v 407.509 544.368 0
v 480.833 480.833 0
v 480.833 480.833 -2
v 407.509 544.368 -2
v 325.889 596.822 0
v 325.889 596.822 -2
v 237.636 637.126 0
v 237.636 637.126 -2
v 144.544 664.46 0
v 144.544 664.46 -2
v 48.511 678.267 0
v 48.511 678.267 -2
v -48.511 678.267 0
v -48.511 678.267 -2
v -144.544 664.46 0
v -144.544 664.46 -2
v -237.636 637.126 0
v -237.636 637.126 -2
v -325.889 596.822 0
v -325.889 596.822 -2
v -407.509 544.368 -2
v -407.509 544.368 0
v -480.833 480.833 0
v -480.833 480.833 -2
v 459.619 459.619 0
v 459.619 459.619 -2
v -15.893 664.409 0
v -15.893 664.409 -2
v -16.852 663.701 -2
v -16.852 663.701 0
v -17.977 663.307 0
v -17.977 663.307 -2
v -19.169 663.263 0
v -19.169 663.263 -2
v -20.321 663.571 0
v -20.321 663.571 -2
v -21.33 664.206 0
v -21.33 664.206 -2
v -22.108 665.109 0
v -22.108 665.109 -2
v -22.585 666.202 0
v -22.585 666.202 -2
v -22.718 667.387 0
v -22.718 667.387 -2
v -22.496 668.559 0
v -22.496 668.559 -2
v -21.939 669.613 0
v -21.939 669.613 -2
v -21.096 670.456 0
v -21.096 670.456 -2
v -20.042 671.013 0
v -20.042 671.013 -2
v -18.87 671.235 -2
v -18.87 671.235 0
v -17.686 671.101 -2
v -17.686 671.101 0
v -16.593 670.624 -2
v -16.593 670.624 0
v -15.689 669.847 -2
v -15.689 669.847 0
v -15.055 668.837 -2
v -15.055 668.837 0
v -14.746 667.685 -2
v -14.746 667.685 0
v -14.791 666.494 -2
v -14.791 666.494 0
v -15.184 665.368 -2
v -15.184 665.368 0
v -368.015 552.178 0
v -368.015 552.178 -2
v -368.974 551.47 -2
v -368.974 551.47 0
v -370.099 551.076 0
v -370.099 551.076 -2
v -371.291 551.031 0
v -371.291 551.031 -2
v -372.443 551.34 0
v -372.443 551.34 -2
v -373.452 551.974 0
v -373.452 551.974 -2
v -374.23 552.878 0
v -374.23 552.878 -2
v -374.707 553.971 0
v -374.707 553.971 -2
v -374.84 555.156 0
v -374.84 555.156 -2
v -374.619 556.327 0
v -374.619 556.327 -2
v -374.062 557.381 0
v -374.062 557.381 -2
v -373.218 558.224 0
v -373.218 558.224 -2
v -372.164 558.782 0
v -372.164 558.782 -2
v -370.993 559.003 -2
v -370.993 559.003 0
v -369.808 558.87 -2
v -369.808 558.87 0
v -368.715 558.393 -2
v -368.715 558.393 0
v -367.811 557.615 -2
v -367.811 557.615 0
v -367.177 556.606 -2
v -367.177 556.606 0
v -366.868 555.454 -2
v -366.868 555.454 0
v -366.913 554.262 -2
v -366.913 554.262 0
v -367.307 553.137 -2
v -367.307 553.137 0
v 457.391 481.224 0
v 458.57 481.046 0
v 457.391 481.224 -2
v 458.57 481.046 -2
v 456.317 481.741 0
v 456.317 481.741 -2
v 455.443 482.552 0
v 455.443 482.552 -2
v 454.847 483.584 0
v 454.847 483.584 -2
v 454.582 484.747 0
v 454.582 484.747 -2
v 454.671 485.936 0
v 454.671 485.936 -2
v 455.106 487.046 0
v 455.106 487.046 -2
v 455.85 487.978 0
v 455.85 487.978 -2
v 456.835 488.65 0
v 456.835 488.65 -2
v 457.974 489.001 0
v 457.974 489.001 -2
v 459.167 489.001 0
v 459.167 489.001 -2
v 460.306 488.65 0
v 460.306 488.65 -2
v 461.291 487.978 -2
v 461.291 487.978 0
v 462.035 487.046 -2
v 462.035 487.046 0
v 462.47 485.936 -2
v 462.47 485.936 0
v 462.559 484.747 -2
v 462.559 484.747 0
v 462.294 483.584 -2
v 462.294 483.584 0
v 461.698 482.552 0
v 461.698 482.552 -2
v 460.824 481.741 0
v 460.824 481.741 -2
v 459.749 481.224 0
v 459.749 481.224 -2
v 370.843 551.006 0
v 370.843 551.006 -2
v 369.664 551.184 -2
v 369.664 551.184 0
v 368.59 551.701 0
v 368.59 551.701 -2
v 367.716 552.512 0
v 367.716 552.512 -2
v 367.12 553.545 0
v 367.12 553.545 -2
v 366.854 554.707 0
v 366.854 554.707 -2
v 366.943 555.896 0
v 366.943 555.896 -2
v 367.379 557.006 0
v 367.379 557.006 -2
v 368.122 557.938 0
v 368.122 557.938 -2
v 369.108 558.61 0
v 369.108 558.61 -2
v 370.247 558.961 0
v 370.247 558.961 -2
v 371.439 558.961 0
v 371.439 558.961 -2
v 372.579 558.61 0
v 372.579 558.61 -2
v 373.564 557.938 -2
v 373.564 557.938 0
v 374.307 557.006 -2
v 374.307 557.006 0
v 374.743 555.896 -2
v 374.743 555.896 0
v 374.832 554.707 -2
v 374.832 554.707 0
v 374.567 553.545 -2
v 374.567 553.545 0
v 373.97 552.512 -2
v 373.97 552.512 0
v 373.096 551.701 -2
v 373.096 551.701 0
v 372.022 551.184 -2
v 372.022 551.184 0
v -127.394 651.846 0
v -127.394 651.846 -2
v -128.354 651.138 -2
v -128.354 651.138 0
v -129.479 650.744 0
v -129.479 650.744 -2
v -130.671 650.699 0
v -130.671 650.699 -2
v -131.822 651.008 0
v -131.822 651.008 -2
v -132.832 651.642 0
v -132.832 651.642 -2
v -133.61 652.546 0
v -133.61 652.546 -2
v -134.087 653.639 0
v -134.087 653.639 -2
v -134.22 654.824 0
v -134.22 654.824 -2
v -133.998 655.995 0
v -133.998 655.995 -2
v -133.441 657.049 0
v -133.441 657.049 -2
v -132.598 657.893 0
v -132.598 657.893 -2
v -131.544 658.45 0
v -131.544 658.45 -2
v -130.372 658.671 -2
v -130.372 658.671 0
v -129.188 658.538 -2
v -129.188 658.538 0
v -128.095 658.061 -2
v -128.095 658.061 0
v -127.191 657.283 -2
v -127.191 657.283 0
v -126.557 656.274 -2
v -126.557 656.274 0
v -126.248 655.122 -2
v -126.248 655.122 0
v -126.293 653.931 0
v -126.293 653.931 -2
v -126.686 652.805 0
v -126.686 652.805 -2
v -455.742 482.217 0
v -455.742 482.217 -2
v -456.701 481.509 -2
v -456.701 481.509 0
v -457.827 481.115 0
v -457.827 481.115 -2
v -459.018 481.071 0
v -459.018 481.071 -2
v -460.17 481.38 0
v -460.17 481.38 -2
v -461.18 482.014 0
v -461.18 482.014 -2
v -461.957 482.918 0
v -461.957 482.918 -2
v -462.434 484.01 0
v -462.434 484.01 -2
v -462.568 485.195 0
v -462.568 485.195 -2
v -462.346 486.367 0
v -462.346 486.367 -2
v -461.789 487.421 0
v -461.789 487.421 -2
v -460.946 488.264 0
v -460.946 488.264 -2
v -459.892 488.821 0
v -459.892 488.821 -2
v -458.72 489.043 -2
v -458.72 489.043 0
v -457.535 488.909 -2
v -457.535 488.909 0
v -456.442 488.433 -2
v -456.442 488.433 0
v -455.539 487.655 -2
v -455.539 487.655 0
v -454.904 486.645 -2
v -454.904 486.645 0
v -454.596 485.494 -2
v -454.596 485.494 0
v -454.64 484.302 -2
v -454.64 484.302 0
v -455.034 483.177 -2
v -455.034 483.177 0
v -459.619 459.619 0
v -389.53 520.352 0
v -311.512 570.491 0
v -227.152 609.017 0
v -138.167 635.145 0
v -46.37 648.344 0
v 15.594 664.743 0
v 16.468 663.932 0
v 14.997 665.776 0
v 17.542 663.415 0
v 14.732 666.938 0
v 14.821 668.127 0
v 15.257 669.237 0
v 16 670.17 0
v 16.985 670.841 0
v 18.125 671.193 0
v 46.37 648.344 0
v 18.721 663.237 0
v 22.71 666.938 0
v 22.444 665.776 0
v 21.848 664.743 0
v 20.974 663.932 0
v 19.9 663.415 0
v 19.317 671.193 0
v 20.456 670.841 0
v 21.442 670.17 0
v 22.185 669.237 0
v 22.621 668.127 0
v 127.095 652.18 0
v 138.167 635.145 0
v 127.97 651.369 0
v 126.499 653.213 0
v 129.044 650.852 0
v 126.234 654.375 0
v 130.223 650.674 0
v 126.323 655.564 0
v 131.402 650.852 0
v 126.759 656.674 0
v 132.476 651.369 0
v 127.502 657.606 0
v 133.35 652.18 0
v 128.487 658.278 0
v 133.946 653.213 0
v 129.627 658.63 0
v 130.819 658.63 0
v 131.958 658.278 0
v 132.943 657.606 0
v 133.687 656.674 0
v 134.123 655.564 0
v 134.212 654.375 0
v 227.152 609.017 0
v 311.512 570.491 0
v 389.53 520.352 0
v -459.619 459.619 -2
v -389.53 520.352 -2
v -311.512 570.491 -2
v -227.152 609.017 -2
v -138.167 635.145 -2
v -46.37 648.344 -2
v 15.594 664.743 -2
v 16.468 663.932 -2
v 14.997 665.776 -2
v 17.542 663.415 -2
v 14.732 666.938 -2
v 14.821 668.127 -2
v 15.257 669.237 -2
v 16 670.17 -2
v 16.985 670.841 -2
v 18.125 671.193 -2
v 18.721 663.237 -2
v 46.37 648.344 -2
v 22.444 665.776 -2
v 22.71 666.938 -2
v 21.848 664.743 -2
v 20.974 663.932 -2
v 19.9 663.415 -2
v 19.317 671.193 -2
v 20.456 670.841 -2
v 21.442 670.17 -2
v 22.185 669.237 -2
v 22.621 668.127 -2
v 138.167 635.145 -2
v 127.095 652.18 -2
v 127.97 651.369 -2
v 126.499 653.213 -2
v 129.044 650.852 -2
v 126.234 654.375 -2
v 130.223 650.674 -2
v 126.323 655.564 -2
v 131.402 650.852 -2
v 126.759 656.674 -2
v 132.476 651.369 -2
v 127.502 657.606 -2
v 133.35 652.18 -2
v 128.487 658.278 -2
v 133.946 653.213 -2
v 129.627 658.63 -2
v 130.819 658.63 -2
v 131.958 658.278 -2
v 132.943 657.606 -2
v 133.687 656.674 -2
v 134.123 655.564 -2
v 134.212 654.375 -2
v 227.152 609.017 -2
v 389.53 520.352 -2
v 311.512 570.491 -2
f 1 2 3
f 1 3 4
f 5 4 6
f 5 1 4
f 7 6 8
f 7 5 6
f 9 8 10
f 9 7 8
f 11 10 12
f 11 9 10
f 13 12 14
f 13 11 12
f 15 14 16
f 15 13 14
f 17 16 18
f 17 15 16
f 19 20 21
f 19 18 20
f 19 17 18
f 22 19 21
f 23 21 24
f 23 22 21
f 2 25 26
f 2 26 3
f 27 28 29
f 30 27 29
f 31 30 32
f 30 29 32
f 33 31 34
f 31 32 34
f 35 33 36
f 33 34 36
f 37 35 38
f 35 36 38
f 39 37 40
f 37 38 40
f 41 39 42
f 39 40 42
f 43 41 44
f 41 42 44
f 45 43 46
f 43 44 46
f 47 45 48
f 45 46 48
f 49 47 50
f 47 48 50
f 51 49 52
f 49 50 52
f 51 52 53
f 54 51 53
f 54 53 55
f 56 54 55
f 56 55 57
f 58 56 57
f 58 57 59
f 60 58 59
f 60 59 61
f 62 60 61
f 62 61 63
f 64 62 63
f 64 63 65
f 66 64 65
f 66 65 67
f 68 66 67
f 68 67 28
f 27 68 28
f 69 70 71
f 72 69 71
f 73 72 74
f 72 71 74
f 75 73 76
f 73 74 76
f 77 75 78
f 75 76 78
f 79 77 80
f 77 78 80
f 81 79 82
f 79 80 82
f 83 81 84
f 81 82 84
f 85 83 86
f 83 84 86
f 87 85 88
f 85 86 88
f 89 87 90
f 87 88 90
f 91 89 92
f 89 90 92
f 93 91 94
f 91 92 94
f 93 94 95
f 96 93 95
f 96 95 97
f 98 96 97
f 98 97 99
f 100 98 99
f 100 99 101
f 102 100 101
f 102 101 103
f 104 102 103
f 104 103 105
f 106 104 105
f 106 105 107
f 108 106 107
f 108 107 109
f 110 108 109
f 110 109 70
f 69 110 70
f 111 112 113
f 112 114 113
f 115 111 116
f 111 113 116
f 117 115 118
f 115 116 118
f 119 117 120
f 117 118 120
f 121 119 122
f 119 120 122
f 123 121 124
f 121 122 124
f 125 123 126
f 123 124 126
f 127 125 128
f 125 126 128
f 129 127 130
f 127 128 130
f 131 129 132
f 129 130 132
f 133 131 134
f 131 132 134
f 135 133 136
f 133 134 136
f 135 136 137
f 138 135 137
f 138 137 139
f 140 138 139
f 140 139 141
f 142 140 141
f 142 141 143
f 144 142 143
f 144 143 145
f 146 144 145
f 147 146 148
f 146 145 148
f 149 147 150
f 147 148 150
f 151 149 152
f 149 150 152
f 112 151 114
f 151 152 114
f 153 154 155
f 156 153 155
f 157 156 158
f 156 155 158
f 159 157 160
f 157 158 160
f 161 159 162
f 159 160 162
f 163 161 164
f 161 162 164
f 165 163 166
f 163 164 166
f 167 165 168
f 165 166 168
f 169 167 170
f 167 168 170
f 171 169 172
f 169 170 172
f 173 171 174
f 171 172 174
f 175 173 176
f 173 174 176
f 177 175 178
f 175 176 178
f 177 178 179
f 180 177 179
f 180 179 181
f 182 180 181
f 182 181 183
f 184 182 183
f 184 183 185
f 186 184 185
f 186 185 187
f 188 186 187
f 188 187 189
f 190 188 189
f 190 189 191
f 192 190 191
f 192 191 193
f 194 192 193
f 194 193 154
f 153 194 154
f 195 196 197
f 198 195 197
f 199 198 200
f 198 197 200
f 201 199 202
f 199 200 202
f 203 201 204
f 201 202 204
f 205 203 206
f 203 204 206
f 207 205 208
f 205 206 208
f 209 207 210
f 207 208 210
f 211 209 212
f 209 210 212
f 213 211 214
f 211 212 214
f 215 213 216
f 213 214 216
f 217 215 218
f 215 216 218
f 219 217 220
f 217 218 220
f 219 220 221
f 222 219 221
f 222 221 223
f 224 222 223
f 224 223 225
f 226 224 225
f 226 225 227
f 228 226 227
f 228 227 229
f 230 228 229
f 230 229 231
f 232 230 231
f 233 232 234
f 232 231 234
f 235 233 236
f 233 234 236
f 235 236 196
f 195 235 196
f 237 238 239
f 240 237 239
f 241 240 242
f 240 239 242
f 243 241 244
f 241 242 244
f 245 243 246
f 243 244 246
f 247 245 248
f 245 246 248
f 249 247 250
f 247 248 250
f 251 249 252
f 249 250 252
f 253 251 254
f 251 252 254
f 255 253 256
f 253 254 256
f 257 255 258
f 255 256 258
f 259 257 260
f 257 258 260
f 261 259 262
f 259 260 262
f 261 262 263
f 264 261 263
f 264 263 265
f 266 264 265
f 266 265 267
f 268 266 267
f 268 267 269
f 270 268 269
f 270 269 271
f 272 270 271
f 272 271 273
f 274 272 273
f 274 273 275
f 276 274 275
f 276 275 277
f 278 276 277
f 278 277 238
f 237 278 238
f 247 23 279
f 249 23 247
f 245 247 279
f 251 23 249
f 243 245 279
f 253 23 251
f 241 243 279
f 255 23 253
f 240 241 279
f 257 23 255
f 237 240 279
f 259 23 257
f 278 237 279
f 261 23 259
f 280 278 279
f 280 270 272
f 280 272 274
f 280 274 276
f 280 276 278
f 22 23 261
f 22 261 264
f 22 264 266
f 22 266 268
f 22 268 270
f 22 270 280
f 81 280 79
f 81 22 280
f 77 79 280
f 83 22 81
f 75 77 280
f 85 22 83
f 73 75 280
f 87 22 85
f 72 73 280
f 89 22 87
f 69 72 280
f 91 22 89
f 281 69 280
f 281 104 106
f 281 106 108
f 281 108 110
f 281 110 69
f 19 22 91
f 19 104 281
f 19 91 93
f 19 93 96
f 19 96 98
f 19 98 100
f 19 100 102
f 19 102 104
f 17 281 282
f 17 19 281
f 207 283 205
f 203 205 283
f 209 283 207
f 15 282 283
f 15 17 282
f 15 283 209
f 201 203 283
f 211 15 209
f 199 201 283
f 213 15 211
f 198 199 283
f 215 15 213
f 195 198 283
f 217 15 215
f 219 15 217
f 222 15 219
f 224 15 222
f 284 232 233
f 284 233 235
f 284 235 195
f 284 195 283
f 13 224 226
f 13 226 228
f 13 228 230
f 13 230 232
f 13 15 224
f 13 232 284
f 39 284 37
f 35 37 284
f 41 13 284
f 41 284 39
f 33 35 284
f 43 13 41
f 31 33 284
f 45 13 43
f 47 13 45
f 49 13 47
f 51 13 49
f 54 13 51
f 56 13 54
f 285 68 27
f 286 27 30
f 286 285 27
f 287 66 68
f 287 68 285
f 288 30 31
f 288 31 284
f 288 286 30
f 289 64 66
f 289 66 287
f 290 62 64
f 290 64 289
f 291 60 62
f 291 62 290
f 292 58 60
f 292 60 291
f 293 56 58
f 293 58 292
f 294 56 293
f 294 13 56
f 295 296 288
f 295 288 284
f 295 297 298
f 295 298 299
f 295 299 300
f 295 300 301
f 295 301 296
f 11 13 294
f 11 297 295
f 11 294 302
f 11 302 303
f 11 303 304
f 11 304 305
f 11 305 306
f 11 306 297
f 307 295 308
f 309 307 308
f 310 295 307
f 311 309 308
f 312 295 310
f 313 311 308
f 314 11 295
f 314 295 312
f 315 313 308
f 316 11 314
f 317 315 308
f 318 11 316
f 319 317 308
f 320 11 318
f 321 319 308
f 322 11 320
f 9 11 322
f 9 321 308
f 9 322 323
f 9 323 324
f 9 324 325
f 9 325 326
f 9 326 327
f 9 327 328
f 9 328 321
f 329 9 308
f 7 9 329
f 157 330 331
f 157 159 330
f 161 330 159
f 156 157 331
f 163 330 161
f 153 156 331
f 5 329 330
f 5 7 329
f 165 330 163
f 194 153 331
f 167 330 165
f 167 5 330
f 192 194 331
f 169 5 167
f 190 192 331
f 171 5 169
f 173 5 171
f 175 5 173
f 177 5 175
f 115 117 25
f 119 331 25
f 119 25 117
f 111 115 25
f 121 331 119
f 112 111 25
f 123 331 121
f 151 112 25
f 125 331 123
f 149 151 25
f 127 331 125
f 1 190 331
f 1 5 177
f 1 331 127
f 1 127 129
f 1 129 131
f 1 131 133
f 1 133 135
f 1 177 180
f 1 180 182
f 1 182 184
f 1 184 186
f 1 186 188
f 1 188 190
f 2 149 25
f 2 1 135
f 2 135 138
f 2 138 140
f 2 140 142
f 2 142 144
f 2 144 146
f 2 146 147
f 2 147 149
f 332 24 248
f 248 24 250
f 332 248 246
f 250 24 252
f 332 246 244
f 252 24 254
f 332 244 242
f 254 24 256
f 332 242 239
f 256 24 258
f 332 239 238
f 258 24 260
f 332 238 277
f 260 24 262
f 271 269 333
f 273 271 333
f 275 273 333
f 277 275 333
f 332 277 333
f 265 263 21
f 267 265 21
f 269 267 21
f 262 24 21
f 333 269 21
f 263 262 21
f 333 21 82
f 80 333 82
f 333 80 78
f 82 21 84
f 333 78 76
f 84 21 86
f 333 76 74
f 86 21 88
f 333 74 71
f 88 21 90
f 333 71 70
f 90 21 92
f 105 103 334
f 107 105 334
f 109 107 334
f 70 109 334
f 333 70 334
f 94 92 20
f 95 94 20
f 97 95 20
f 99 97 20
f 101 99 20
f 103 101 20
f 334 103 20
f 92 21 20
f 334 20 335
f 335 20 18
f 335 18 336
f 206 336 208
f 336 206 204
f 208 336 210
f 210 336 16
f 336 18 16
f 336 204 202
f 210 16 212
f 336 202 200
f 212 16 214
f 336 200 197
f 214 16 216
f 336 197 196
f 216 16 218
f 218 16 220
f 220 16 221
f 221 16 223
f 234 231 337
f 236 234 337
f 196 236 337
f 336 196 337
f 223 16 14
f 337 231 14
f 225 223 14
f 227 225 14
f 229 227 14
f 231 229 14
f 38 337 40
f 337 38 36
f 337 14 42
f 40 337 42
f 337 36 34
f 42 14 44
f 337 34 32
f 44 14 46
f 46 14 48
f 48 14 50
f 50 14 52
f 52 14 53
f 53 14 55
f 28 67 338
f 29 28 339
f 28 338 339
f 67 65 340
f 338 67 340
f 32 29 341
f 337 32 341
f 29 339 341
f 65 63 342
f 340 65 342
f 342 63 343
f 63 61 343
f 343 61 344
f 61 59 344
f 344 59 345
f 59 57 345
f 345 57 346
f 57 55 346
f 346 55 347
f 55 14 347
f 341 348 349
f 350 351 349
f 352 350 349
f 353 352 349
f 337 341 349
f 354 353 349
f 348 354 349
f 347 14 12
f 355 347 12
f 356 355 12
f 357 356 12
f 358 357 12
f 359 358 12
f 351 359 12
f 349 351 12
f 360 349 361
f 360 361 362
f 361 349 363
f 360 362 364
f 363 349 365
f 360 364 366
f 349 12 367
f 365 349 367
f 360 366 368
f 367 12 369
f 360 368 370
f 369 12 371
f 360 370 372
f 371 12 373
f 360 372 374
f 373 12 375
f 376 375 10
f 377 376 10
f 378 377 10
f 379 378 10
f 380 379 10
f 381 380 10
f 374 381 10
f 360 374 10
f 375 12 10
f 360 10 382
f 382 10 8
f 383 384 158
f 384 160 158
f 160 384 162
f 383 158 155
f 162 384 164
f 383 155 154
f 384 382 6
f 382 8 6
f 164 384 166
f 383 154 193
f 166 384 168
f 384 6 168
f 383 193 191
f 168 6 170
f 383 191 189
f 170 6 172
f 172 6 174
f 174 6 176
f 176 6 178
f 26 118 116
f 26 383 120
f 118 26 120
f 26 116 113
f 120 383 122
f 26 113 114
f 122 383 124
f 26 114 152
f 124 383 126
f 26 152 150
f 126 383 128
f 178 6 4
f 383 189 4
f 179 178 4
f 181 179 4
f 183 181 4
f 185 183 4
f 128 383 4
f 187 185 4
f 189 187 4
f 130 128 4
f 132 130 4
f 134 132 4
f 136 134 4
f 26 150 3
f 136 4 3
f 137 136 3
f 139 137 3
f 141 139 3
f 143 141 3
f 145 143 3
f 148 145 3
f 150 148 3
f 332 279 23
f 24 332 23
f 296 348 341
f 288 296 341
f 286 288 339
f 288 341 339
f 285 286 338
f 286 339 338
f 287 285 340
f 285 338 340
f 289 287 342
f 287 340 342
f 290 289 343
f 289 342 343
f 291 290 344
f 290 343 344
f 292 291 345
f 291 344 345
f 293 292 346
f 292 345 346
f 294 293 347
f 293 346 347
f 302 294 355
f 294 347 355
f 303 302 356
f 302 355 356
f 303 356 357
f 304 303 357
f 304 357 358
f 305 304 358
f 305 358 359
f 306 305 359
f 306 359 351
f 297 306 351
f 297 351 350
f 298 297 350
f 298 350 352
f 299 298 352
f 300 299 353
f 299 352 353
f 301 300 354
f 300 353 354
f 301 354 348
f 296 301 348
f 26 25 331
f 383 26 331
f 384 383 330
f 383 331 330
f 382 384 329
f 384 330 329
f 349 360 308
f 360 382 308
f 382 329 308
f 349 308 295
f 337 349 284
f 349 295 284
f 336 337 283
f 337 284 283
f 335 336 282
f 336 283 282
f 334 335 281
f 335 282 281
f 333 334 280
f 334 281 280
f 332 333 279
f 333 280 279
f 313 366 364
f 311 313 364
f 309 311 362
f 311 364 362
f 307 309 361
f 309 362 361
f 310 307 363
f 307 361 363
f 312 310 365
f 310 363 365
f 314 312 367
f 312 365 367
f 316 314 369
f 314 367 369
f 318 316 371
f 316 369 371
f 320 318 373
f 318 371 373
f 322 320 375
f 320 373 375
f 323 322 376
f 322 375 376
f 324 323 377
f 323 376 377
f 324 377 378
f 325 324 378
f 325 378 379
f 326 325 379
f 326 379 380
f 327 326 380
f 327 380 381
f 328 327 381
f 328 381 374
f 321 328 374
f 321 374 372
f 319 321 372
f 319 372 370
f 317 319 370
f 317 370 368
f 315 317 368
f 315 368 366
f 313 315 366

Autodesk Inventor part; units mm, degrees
ref_plane "YZ Plane" through (0, 0, 0) normal (1, 0, 0) x (0, 1, 0)
ref_plane "XZ Plane" through (0, 0, 0) normal (0, 1, 0) x (-1, 0, 0)
ref_plane "XY Plane" through (0, 0, 0) normal (0, 0, 1) x (1, 0, 0)
sketch "Sketch1" plane through (0, 0, 0) normal (0, 0, 1) x (1, 0, 0)
  circle A0 centre (0, 0) radius 650
  circle A1 centre (0, 0) radius 680
  line L0 (0, 0) -> (-480.8326, 480.8326)
  line L1 (0, 0) -> (0, 680)
  line L2 (0, 0) -> (480.8326, 480.8326)
  point P0 (-459.6194, 459.6194)
  point P1 (459.6194, 459.6194)
  dimension "d30" = 90
  dimension "d31" = 1360
  dimension "d32" = 1300
extrude "Plate1" add sketch "Sketch1" against normal blind 2 contours A0 L1 A1 L2 | L0 A1 L1 A0
sketch "Sketch2" plane through (0, 0, 0) normal (0, 0, 1) x (1, 0, 0)
  circle A0 centre (0, 0) radius 667.5
  arc A1 (480.8326, 480.8326) -> (-480.8326, 480.8326) centre (0, 0) ccw projected
  line L0 (0, 0) -> (480.8326, 480.8326) construction
  line L1 (0, 0) -> (458.5704, 485.0458) construction
  line L2 (370.8431, 555.006) -> (0, 0) construction
  line L3 (0, 0) -> (0, 667.5) construction
  line L4 (0, 0) -> (18.7209, 667.2374) construction
  line L5 (0, 0) -> (130.2228, 654.6742) construction
  line L6 (0, 0) -> (339.1403, 574.9262) construction
  line L7 (0, 0) -> (238.0449, 623.6112) construction
  dimension "d34" = 1335
  dimension "d35" = 1.607
  dimension "d36" = 9.643
  dimension "d44" = 1.607
  dimension "d45" = 9.643
  dimension "d49" = 3.214
  dimension "d50" = 9.643
hole "Hole1" at (458.5704, 485.0458, 0) at (370.8431, 555.006, 0) at (130.2228, 654.6742, 0) at (18.7209, 667.2374, 0) direction (0, 0, -1) diameter 8 end through all
pattern_circular "Circular Pattern1" count 2 over 45 about axis through (0, 0, -10) along (0, 0, 1) of "Hole1"
equation "\"d31\" = Колесо_диам_1"
equation "\"d32\" = Колесо_диам_2"
equation "\"d44\" = d35"
equation "\"d45\" = d36"
equation "\"d49\" = 2 * d35"
equation "\"d50\" = d36"
equation "\"d42\" = Thickness"
equation "\"d15\" = Thickness"
equation "\"BendRadius\" = Thickness"
equation "\"BendReliefWidth\" = Thickness"
equation "\"BendReliefDepth\" = 0.5 * Thickness"
equation "\"CornerReliefSize\" = 4 * Thickness"
equation "\"MinimumRemnant\" = 2 * Thickness"
equation "\"TransitionRadius\" = BendRadius"
equation "\"JacobiRadiusSize\" = BendRadius"
equation "\"GapSize\" = Thickness"
equation "\"Колесо_диам_1\" = 1360"
equation "\"Колесо_диам_2\" = 1300"
equation "\"Thickness\" = 2"
properties part number "DMF2.0 01 43 Gear rim 3"
